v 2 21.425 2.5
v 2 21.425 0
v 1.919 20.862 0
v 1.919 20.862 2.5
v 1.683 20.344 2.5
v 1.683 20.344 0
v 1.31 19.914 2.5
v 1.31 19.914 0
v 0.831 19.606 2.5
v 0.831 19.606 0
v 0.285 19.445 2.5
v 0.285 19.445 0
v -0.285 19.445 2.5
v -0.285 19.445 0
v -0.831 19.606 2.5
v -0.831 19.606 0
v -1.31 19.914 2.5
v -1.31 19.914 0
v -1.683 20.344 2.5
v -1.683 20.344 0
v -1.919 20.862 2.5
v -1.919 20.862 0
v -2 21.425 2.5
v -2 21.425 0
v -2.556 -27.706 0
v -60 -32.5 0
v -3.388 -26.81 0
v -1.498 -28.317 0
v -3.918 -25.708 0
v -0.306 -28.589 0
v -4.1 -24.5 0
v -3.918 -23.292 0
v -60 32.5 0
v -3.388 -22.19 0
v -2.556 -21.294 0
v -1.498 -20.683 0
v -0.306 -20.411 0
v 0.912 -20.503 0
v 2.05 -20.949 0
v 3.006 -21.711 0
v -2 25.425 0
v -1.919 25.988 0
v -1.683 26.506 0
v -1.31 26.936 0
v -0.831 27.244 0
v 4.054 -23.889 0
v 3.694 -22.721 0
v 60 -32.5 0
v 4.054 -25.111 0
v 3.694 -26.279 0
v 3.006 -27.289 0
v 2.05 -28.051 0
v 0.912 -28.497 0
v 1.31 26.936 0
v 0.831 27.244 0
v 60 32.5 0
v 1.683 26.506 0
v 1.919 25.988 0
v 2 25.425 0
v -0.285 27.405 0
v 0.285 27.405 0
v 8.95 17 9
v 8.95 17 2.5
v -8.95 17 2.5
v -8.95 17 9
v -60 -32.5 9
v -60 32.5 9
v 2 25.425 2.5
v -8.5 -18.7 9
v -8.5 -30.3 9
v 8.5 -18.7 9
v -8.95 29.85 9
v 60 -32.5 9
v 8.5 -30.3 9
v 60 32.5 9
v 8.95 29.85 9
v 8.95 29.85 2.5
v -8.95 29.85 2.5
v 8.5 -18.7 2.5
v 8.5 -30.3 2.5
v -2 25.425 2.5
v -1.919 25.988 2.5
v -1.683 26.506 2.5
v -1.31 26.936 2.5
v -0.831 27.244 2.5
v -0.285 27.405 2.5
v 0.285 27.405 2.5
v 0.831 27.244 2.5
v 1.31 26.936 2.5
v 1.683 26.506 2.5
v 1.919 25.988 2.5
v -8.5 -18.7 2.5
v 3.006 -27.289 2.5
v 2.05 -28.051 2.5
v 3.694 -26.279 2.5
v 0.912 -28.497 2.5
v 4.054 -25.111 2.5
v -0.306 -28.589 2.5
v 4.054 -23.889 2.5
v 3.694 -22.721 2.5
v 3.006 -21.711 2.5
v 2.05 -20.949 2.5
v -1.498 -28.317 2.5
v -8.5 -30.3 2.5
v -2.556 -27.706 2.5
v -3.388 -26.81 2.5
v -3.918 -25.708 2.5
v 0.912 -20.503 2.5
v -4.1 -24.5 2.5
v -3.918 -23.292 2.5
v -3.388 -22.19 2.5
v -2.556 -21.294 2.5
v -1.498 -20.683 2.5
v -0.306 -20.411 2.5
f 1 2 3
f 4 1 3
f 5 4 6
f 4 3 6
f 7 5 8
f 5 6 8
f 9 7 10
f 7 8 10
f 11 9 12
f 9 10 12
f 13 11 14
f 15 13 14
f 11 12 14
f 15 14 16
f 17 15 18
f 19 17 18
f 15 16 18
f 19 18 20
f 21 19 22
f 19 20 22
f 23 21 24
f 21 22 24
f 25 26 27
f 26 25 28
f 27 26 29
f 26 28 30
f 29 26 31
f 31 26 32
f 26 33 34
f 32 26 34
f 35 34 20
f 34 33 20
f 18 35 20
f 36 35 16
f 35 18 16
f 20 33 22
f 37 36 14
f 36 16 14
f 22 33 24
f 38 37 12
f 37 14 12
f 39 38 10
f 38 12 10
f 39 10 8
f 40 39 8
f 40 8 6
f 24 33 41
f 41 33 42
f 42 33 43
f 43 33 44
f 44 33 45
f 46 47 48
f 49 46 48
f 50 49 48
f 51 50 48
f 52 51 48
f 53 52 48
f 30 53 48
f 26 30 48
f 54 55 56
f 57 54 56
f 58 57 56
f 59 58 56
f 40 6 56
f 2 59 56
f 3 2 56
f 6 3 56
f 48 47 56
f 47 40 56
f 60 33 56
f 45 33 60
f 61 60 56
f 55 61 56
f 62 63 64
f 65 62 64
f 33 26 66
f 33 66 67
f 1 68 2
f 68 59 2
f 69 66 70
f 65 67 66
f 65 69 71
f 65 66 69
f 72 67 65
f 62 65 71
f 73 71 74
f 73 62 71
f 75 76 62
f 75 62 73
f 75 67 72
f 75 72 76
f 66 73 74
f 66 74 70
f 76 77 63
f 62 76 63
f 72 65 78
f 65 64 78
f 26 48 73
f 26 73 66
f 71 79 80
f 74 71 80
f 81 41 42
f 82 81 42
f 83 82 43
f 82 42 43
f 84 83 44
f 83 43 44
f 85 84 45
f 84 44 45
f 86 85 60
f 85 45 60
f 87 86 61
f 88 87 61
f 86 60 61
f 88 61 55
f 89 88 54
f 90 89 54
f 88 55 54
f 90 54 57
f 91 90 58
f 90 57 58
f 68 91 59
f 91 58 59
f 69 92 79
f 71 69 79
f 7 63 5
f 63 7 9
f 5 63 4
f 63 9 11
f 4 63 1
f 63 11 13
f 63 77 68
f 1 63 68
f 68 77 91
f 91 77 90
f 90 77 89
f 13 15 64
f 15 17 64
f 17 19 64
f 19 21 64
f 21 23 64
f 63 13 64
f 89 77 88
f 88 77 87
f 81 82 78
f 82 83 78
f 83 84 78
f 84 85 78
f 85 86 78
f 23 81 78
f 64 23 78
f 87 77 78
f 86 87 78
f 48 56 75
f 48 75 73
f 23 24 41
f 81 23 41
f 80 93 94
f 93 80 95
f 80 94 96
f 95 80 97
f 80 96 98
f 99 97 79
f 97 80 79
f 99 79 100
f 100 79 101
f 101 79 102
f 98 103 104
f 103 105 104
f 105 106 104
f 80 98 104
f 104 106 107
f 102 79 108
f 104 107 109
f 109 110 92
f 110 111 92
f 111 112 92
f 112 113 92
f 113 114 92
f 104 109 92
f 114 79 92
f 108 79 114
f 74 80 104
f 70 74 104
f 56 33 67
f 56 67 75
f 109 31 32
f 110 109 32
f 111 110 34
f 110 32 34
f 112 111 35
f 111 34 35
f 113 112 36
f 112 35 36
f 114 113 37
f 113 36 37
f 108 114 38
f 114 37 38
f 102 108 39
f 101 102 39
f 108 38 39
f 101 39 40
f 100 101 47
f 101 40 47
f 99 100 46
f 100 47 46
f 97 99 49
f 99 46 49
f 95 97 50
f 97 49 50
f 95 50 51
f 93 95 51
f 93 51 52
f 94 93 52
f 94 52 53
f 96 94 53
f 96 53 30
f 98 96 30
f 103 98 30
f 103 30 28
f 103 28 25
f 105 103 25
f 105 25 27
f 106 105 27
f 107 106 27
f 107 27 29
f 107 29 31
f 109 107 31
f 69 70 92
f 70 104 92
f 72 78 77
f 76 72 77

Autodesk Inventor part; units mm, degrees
ref_plane "YZ Plane" through (0, 0, 0) normal (1, 0, 0) x (0, 1, 0)
ref_plane "XZ Plane" through (0, 0, 0) normal (0, 1, 0) x (-1, 0, 0)
ref_plane "XY Plane" through (0, 0, 0) normal (0, 0, 1) x (1, 0, 0)
sketch "Schizzo1" plane through (0, 0, 0) normal (0, 0, 1) x (1, 0, 0)
  line L0 (-60, 32.5) -> (60, 32.5)
  line L1 (60, 32.5) -> (60, -32.5)
  line L2 (60, -32.5) -> (-60, -32.5)
  line L3 (-60, -32.5) -> (-60, 32.5)
  line L4 (-60, 32.5) -> (60, -32.5) construction
  line L5 (60, 32.5) -> (-60, -32.5) construction
  line L6 (-8.5, -18.7) -> (8.5, -18.7)
  line L7 (8.5, -18.7) -> (8.5, -30.3)
  line L8 (8.5, -30.3) -> (-8.5, -30.3)
  line L9 (-8.5, -30.3) -> (-8.5, -18.7)
  line L10 (-8.5, -18.7) -> (8.5, -30.3) construction
  line L11 (8.5, -18.7) -> (-8.5, -30.3) construction
  line L12 (-12, 12) -> (12, -12) construction
  line L13 (12, 12) -> (-12, -12) construction
  line L14 (-8.95, 29.85) -> (8.95, 29.85)
  line L15 (8.95, 29.85) -> (8.95, 17)
  line L16 (8.95, 17) -> (-8.95, 17)
  line L17 (-8.95, 17) -> (-8.95, 29.85)
  line L18 (-8.95, 29.85) -> (8.95, 17) construction
  line L19 (8.95, 29.85) -> (-8.95, 17) construction
  circle A0 centre (0, -24.5) radius 4.1
  line L20 (0, 25.425) -> (0, 21.425) construction
  line L21 (-2, 25.425) -> (-2, 21.425)
  line L22 (2, 21.425) -> (2, 25.425)
  arc A1 (2, 25.425) -> (-2, 25.425) centre (0, 25.425) ccw
  arc A2 (-2, 21.425) -> (2, 21.425) centre (0, 21.425) ccw
  point P0 (0, 0)
  point P1 (0, 0)
  point P2 (0, 23.425)
  dimension "d0" = 120
  dimension "d1" = 65
  dimension "d2" = 17
  dimension "d3" = 11.6
  dimension "d4" = 24
  dimension "d5" = 24
  dimension "d6" = 17.9
  dimension "d7" = 12.85
  dimension "d8" = 8.2
  dimension "d9" = 2
  dimension "d10" = 4
extrude "Estrusione1" add sketch "Schizzo1" along normal blind 9 contours L0 L1 L2 L3
sketch "Schizzo2" plane through (0, 0, 0) normal (0, 0, -1) x (-1, 0, 0)
  line L0 (-60, 32.5) -> (60, 32.5)
  line L1 (60, 32.5) -> (60, -32.5)
  line L2 (60, -32.5) -> (-60, -32.5)
  line L3 (-60, -32.5) -> (-60, 32.5)
  line L4 (-60, 32.5) -> (60, -32.5) construction
  line L5 (60, 32.5) -> (-60, -32.5) construction
  line L6 (-8.95, 17) -> (-8.95, 29.85)
  line L7 (-12, 12) -> (12, -12) construction
  line L8 (12, 12) -> (-12, -12) construction
  line L9 (8.95, 17) -> (-8.95, 17)
  line L10 (-8.95, 29.85) -> (8.95, 29.85)
  line L11 (8.95, 29.85) -> (-8.95, 17) construction
  line L12 (8.95, 29.85) -> (8.95, 17)
  line L13 (-8.95, 29.85) -> (8.95, 17) construction
  line L14 (-8.5, -18.7) -> (8.5, -18.7)
  line L15 (8.5, -18.7) -> (8.5, -30.3)
  line L16 (8.5, -30.3) -> (-8.5, -30.3)
  line L17 (-8.5, -30.3) -> (-8.5, -18.7)
  line L18 (-8.5, -18.7) -> (8.5, -30.3) construction
  line L19 (8.5, -18.7) -> (-8.5, -30.3) construction
  circle A0 centre (0, -24.5) radius 4.1
  line L20 (0, 25.425) -> (0, 21.425) construction
  line L21 (-2, 25.425) -> (-2, 21.425)
  line L22 (2, 21.425) -> (2, 25.425)
  arc A1 (2, 25.425) -> (-2, 25.425) centre (0, 25.425) ccw
  arc A2 (-2, 21.425) -> (2, 21.425) centre (0, 21.425) ccw
  point P0 (0, 0)
  point P1 (0, 0)
  point P2 (0, 0)
  point P3 (0, 23.425)
  dimension "d13" = 120
  dimension "d14" = 65
  dimension "d15" = 17
  dimension "d16" = 11.6
  dimension "d17" = 24
  dimension "d18" = 24
  dimension "d19" = 17.9
  dimension "d20" = 12.85
  dimension "d21" = 8.2
  dimension "d22" = 2
  dimension "d23" = 4
extrude "Estrusione2" add sketch "Schizzo2" against normal blind 2.5 contours L6 L10 L12 L9 | L14 L15 L16 L17
